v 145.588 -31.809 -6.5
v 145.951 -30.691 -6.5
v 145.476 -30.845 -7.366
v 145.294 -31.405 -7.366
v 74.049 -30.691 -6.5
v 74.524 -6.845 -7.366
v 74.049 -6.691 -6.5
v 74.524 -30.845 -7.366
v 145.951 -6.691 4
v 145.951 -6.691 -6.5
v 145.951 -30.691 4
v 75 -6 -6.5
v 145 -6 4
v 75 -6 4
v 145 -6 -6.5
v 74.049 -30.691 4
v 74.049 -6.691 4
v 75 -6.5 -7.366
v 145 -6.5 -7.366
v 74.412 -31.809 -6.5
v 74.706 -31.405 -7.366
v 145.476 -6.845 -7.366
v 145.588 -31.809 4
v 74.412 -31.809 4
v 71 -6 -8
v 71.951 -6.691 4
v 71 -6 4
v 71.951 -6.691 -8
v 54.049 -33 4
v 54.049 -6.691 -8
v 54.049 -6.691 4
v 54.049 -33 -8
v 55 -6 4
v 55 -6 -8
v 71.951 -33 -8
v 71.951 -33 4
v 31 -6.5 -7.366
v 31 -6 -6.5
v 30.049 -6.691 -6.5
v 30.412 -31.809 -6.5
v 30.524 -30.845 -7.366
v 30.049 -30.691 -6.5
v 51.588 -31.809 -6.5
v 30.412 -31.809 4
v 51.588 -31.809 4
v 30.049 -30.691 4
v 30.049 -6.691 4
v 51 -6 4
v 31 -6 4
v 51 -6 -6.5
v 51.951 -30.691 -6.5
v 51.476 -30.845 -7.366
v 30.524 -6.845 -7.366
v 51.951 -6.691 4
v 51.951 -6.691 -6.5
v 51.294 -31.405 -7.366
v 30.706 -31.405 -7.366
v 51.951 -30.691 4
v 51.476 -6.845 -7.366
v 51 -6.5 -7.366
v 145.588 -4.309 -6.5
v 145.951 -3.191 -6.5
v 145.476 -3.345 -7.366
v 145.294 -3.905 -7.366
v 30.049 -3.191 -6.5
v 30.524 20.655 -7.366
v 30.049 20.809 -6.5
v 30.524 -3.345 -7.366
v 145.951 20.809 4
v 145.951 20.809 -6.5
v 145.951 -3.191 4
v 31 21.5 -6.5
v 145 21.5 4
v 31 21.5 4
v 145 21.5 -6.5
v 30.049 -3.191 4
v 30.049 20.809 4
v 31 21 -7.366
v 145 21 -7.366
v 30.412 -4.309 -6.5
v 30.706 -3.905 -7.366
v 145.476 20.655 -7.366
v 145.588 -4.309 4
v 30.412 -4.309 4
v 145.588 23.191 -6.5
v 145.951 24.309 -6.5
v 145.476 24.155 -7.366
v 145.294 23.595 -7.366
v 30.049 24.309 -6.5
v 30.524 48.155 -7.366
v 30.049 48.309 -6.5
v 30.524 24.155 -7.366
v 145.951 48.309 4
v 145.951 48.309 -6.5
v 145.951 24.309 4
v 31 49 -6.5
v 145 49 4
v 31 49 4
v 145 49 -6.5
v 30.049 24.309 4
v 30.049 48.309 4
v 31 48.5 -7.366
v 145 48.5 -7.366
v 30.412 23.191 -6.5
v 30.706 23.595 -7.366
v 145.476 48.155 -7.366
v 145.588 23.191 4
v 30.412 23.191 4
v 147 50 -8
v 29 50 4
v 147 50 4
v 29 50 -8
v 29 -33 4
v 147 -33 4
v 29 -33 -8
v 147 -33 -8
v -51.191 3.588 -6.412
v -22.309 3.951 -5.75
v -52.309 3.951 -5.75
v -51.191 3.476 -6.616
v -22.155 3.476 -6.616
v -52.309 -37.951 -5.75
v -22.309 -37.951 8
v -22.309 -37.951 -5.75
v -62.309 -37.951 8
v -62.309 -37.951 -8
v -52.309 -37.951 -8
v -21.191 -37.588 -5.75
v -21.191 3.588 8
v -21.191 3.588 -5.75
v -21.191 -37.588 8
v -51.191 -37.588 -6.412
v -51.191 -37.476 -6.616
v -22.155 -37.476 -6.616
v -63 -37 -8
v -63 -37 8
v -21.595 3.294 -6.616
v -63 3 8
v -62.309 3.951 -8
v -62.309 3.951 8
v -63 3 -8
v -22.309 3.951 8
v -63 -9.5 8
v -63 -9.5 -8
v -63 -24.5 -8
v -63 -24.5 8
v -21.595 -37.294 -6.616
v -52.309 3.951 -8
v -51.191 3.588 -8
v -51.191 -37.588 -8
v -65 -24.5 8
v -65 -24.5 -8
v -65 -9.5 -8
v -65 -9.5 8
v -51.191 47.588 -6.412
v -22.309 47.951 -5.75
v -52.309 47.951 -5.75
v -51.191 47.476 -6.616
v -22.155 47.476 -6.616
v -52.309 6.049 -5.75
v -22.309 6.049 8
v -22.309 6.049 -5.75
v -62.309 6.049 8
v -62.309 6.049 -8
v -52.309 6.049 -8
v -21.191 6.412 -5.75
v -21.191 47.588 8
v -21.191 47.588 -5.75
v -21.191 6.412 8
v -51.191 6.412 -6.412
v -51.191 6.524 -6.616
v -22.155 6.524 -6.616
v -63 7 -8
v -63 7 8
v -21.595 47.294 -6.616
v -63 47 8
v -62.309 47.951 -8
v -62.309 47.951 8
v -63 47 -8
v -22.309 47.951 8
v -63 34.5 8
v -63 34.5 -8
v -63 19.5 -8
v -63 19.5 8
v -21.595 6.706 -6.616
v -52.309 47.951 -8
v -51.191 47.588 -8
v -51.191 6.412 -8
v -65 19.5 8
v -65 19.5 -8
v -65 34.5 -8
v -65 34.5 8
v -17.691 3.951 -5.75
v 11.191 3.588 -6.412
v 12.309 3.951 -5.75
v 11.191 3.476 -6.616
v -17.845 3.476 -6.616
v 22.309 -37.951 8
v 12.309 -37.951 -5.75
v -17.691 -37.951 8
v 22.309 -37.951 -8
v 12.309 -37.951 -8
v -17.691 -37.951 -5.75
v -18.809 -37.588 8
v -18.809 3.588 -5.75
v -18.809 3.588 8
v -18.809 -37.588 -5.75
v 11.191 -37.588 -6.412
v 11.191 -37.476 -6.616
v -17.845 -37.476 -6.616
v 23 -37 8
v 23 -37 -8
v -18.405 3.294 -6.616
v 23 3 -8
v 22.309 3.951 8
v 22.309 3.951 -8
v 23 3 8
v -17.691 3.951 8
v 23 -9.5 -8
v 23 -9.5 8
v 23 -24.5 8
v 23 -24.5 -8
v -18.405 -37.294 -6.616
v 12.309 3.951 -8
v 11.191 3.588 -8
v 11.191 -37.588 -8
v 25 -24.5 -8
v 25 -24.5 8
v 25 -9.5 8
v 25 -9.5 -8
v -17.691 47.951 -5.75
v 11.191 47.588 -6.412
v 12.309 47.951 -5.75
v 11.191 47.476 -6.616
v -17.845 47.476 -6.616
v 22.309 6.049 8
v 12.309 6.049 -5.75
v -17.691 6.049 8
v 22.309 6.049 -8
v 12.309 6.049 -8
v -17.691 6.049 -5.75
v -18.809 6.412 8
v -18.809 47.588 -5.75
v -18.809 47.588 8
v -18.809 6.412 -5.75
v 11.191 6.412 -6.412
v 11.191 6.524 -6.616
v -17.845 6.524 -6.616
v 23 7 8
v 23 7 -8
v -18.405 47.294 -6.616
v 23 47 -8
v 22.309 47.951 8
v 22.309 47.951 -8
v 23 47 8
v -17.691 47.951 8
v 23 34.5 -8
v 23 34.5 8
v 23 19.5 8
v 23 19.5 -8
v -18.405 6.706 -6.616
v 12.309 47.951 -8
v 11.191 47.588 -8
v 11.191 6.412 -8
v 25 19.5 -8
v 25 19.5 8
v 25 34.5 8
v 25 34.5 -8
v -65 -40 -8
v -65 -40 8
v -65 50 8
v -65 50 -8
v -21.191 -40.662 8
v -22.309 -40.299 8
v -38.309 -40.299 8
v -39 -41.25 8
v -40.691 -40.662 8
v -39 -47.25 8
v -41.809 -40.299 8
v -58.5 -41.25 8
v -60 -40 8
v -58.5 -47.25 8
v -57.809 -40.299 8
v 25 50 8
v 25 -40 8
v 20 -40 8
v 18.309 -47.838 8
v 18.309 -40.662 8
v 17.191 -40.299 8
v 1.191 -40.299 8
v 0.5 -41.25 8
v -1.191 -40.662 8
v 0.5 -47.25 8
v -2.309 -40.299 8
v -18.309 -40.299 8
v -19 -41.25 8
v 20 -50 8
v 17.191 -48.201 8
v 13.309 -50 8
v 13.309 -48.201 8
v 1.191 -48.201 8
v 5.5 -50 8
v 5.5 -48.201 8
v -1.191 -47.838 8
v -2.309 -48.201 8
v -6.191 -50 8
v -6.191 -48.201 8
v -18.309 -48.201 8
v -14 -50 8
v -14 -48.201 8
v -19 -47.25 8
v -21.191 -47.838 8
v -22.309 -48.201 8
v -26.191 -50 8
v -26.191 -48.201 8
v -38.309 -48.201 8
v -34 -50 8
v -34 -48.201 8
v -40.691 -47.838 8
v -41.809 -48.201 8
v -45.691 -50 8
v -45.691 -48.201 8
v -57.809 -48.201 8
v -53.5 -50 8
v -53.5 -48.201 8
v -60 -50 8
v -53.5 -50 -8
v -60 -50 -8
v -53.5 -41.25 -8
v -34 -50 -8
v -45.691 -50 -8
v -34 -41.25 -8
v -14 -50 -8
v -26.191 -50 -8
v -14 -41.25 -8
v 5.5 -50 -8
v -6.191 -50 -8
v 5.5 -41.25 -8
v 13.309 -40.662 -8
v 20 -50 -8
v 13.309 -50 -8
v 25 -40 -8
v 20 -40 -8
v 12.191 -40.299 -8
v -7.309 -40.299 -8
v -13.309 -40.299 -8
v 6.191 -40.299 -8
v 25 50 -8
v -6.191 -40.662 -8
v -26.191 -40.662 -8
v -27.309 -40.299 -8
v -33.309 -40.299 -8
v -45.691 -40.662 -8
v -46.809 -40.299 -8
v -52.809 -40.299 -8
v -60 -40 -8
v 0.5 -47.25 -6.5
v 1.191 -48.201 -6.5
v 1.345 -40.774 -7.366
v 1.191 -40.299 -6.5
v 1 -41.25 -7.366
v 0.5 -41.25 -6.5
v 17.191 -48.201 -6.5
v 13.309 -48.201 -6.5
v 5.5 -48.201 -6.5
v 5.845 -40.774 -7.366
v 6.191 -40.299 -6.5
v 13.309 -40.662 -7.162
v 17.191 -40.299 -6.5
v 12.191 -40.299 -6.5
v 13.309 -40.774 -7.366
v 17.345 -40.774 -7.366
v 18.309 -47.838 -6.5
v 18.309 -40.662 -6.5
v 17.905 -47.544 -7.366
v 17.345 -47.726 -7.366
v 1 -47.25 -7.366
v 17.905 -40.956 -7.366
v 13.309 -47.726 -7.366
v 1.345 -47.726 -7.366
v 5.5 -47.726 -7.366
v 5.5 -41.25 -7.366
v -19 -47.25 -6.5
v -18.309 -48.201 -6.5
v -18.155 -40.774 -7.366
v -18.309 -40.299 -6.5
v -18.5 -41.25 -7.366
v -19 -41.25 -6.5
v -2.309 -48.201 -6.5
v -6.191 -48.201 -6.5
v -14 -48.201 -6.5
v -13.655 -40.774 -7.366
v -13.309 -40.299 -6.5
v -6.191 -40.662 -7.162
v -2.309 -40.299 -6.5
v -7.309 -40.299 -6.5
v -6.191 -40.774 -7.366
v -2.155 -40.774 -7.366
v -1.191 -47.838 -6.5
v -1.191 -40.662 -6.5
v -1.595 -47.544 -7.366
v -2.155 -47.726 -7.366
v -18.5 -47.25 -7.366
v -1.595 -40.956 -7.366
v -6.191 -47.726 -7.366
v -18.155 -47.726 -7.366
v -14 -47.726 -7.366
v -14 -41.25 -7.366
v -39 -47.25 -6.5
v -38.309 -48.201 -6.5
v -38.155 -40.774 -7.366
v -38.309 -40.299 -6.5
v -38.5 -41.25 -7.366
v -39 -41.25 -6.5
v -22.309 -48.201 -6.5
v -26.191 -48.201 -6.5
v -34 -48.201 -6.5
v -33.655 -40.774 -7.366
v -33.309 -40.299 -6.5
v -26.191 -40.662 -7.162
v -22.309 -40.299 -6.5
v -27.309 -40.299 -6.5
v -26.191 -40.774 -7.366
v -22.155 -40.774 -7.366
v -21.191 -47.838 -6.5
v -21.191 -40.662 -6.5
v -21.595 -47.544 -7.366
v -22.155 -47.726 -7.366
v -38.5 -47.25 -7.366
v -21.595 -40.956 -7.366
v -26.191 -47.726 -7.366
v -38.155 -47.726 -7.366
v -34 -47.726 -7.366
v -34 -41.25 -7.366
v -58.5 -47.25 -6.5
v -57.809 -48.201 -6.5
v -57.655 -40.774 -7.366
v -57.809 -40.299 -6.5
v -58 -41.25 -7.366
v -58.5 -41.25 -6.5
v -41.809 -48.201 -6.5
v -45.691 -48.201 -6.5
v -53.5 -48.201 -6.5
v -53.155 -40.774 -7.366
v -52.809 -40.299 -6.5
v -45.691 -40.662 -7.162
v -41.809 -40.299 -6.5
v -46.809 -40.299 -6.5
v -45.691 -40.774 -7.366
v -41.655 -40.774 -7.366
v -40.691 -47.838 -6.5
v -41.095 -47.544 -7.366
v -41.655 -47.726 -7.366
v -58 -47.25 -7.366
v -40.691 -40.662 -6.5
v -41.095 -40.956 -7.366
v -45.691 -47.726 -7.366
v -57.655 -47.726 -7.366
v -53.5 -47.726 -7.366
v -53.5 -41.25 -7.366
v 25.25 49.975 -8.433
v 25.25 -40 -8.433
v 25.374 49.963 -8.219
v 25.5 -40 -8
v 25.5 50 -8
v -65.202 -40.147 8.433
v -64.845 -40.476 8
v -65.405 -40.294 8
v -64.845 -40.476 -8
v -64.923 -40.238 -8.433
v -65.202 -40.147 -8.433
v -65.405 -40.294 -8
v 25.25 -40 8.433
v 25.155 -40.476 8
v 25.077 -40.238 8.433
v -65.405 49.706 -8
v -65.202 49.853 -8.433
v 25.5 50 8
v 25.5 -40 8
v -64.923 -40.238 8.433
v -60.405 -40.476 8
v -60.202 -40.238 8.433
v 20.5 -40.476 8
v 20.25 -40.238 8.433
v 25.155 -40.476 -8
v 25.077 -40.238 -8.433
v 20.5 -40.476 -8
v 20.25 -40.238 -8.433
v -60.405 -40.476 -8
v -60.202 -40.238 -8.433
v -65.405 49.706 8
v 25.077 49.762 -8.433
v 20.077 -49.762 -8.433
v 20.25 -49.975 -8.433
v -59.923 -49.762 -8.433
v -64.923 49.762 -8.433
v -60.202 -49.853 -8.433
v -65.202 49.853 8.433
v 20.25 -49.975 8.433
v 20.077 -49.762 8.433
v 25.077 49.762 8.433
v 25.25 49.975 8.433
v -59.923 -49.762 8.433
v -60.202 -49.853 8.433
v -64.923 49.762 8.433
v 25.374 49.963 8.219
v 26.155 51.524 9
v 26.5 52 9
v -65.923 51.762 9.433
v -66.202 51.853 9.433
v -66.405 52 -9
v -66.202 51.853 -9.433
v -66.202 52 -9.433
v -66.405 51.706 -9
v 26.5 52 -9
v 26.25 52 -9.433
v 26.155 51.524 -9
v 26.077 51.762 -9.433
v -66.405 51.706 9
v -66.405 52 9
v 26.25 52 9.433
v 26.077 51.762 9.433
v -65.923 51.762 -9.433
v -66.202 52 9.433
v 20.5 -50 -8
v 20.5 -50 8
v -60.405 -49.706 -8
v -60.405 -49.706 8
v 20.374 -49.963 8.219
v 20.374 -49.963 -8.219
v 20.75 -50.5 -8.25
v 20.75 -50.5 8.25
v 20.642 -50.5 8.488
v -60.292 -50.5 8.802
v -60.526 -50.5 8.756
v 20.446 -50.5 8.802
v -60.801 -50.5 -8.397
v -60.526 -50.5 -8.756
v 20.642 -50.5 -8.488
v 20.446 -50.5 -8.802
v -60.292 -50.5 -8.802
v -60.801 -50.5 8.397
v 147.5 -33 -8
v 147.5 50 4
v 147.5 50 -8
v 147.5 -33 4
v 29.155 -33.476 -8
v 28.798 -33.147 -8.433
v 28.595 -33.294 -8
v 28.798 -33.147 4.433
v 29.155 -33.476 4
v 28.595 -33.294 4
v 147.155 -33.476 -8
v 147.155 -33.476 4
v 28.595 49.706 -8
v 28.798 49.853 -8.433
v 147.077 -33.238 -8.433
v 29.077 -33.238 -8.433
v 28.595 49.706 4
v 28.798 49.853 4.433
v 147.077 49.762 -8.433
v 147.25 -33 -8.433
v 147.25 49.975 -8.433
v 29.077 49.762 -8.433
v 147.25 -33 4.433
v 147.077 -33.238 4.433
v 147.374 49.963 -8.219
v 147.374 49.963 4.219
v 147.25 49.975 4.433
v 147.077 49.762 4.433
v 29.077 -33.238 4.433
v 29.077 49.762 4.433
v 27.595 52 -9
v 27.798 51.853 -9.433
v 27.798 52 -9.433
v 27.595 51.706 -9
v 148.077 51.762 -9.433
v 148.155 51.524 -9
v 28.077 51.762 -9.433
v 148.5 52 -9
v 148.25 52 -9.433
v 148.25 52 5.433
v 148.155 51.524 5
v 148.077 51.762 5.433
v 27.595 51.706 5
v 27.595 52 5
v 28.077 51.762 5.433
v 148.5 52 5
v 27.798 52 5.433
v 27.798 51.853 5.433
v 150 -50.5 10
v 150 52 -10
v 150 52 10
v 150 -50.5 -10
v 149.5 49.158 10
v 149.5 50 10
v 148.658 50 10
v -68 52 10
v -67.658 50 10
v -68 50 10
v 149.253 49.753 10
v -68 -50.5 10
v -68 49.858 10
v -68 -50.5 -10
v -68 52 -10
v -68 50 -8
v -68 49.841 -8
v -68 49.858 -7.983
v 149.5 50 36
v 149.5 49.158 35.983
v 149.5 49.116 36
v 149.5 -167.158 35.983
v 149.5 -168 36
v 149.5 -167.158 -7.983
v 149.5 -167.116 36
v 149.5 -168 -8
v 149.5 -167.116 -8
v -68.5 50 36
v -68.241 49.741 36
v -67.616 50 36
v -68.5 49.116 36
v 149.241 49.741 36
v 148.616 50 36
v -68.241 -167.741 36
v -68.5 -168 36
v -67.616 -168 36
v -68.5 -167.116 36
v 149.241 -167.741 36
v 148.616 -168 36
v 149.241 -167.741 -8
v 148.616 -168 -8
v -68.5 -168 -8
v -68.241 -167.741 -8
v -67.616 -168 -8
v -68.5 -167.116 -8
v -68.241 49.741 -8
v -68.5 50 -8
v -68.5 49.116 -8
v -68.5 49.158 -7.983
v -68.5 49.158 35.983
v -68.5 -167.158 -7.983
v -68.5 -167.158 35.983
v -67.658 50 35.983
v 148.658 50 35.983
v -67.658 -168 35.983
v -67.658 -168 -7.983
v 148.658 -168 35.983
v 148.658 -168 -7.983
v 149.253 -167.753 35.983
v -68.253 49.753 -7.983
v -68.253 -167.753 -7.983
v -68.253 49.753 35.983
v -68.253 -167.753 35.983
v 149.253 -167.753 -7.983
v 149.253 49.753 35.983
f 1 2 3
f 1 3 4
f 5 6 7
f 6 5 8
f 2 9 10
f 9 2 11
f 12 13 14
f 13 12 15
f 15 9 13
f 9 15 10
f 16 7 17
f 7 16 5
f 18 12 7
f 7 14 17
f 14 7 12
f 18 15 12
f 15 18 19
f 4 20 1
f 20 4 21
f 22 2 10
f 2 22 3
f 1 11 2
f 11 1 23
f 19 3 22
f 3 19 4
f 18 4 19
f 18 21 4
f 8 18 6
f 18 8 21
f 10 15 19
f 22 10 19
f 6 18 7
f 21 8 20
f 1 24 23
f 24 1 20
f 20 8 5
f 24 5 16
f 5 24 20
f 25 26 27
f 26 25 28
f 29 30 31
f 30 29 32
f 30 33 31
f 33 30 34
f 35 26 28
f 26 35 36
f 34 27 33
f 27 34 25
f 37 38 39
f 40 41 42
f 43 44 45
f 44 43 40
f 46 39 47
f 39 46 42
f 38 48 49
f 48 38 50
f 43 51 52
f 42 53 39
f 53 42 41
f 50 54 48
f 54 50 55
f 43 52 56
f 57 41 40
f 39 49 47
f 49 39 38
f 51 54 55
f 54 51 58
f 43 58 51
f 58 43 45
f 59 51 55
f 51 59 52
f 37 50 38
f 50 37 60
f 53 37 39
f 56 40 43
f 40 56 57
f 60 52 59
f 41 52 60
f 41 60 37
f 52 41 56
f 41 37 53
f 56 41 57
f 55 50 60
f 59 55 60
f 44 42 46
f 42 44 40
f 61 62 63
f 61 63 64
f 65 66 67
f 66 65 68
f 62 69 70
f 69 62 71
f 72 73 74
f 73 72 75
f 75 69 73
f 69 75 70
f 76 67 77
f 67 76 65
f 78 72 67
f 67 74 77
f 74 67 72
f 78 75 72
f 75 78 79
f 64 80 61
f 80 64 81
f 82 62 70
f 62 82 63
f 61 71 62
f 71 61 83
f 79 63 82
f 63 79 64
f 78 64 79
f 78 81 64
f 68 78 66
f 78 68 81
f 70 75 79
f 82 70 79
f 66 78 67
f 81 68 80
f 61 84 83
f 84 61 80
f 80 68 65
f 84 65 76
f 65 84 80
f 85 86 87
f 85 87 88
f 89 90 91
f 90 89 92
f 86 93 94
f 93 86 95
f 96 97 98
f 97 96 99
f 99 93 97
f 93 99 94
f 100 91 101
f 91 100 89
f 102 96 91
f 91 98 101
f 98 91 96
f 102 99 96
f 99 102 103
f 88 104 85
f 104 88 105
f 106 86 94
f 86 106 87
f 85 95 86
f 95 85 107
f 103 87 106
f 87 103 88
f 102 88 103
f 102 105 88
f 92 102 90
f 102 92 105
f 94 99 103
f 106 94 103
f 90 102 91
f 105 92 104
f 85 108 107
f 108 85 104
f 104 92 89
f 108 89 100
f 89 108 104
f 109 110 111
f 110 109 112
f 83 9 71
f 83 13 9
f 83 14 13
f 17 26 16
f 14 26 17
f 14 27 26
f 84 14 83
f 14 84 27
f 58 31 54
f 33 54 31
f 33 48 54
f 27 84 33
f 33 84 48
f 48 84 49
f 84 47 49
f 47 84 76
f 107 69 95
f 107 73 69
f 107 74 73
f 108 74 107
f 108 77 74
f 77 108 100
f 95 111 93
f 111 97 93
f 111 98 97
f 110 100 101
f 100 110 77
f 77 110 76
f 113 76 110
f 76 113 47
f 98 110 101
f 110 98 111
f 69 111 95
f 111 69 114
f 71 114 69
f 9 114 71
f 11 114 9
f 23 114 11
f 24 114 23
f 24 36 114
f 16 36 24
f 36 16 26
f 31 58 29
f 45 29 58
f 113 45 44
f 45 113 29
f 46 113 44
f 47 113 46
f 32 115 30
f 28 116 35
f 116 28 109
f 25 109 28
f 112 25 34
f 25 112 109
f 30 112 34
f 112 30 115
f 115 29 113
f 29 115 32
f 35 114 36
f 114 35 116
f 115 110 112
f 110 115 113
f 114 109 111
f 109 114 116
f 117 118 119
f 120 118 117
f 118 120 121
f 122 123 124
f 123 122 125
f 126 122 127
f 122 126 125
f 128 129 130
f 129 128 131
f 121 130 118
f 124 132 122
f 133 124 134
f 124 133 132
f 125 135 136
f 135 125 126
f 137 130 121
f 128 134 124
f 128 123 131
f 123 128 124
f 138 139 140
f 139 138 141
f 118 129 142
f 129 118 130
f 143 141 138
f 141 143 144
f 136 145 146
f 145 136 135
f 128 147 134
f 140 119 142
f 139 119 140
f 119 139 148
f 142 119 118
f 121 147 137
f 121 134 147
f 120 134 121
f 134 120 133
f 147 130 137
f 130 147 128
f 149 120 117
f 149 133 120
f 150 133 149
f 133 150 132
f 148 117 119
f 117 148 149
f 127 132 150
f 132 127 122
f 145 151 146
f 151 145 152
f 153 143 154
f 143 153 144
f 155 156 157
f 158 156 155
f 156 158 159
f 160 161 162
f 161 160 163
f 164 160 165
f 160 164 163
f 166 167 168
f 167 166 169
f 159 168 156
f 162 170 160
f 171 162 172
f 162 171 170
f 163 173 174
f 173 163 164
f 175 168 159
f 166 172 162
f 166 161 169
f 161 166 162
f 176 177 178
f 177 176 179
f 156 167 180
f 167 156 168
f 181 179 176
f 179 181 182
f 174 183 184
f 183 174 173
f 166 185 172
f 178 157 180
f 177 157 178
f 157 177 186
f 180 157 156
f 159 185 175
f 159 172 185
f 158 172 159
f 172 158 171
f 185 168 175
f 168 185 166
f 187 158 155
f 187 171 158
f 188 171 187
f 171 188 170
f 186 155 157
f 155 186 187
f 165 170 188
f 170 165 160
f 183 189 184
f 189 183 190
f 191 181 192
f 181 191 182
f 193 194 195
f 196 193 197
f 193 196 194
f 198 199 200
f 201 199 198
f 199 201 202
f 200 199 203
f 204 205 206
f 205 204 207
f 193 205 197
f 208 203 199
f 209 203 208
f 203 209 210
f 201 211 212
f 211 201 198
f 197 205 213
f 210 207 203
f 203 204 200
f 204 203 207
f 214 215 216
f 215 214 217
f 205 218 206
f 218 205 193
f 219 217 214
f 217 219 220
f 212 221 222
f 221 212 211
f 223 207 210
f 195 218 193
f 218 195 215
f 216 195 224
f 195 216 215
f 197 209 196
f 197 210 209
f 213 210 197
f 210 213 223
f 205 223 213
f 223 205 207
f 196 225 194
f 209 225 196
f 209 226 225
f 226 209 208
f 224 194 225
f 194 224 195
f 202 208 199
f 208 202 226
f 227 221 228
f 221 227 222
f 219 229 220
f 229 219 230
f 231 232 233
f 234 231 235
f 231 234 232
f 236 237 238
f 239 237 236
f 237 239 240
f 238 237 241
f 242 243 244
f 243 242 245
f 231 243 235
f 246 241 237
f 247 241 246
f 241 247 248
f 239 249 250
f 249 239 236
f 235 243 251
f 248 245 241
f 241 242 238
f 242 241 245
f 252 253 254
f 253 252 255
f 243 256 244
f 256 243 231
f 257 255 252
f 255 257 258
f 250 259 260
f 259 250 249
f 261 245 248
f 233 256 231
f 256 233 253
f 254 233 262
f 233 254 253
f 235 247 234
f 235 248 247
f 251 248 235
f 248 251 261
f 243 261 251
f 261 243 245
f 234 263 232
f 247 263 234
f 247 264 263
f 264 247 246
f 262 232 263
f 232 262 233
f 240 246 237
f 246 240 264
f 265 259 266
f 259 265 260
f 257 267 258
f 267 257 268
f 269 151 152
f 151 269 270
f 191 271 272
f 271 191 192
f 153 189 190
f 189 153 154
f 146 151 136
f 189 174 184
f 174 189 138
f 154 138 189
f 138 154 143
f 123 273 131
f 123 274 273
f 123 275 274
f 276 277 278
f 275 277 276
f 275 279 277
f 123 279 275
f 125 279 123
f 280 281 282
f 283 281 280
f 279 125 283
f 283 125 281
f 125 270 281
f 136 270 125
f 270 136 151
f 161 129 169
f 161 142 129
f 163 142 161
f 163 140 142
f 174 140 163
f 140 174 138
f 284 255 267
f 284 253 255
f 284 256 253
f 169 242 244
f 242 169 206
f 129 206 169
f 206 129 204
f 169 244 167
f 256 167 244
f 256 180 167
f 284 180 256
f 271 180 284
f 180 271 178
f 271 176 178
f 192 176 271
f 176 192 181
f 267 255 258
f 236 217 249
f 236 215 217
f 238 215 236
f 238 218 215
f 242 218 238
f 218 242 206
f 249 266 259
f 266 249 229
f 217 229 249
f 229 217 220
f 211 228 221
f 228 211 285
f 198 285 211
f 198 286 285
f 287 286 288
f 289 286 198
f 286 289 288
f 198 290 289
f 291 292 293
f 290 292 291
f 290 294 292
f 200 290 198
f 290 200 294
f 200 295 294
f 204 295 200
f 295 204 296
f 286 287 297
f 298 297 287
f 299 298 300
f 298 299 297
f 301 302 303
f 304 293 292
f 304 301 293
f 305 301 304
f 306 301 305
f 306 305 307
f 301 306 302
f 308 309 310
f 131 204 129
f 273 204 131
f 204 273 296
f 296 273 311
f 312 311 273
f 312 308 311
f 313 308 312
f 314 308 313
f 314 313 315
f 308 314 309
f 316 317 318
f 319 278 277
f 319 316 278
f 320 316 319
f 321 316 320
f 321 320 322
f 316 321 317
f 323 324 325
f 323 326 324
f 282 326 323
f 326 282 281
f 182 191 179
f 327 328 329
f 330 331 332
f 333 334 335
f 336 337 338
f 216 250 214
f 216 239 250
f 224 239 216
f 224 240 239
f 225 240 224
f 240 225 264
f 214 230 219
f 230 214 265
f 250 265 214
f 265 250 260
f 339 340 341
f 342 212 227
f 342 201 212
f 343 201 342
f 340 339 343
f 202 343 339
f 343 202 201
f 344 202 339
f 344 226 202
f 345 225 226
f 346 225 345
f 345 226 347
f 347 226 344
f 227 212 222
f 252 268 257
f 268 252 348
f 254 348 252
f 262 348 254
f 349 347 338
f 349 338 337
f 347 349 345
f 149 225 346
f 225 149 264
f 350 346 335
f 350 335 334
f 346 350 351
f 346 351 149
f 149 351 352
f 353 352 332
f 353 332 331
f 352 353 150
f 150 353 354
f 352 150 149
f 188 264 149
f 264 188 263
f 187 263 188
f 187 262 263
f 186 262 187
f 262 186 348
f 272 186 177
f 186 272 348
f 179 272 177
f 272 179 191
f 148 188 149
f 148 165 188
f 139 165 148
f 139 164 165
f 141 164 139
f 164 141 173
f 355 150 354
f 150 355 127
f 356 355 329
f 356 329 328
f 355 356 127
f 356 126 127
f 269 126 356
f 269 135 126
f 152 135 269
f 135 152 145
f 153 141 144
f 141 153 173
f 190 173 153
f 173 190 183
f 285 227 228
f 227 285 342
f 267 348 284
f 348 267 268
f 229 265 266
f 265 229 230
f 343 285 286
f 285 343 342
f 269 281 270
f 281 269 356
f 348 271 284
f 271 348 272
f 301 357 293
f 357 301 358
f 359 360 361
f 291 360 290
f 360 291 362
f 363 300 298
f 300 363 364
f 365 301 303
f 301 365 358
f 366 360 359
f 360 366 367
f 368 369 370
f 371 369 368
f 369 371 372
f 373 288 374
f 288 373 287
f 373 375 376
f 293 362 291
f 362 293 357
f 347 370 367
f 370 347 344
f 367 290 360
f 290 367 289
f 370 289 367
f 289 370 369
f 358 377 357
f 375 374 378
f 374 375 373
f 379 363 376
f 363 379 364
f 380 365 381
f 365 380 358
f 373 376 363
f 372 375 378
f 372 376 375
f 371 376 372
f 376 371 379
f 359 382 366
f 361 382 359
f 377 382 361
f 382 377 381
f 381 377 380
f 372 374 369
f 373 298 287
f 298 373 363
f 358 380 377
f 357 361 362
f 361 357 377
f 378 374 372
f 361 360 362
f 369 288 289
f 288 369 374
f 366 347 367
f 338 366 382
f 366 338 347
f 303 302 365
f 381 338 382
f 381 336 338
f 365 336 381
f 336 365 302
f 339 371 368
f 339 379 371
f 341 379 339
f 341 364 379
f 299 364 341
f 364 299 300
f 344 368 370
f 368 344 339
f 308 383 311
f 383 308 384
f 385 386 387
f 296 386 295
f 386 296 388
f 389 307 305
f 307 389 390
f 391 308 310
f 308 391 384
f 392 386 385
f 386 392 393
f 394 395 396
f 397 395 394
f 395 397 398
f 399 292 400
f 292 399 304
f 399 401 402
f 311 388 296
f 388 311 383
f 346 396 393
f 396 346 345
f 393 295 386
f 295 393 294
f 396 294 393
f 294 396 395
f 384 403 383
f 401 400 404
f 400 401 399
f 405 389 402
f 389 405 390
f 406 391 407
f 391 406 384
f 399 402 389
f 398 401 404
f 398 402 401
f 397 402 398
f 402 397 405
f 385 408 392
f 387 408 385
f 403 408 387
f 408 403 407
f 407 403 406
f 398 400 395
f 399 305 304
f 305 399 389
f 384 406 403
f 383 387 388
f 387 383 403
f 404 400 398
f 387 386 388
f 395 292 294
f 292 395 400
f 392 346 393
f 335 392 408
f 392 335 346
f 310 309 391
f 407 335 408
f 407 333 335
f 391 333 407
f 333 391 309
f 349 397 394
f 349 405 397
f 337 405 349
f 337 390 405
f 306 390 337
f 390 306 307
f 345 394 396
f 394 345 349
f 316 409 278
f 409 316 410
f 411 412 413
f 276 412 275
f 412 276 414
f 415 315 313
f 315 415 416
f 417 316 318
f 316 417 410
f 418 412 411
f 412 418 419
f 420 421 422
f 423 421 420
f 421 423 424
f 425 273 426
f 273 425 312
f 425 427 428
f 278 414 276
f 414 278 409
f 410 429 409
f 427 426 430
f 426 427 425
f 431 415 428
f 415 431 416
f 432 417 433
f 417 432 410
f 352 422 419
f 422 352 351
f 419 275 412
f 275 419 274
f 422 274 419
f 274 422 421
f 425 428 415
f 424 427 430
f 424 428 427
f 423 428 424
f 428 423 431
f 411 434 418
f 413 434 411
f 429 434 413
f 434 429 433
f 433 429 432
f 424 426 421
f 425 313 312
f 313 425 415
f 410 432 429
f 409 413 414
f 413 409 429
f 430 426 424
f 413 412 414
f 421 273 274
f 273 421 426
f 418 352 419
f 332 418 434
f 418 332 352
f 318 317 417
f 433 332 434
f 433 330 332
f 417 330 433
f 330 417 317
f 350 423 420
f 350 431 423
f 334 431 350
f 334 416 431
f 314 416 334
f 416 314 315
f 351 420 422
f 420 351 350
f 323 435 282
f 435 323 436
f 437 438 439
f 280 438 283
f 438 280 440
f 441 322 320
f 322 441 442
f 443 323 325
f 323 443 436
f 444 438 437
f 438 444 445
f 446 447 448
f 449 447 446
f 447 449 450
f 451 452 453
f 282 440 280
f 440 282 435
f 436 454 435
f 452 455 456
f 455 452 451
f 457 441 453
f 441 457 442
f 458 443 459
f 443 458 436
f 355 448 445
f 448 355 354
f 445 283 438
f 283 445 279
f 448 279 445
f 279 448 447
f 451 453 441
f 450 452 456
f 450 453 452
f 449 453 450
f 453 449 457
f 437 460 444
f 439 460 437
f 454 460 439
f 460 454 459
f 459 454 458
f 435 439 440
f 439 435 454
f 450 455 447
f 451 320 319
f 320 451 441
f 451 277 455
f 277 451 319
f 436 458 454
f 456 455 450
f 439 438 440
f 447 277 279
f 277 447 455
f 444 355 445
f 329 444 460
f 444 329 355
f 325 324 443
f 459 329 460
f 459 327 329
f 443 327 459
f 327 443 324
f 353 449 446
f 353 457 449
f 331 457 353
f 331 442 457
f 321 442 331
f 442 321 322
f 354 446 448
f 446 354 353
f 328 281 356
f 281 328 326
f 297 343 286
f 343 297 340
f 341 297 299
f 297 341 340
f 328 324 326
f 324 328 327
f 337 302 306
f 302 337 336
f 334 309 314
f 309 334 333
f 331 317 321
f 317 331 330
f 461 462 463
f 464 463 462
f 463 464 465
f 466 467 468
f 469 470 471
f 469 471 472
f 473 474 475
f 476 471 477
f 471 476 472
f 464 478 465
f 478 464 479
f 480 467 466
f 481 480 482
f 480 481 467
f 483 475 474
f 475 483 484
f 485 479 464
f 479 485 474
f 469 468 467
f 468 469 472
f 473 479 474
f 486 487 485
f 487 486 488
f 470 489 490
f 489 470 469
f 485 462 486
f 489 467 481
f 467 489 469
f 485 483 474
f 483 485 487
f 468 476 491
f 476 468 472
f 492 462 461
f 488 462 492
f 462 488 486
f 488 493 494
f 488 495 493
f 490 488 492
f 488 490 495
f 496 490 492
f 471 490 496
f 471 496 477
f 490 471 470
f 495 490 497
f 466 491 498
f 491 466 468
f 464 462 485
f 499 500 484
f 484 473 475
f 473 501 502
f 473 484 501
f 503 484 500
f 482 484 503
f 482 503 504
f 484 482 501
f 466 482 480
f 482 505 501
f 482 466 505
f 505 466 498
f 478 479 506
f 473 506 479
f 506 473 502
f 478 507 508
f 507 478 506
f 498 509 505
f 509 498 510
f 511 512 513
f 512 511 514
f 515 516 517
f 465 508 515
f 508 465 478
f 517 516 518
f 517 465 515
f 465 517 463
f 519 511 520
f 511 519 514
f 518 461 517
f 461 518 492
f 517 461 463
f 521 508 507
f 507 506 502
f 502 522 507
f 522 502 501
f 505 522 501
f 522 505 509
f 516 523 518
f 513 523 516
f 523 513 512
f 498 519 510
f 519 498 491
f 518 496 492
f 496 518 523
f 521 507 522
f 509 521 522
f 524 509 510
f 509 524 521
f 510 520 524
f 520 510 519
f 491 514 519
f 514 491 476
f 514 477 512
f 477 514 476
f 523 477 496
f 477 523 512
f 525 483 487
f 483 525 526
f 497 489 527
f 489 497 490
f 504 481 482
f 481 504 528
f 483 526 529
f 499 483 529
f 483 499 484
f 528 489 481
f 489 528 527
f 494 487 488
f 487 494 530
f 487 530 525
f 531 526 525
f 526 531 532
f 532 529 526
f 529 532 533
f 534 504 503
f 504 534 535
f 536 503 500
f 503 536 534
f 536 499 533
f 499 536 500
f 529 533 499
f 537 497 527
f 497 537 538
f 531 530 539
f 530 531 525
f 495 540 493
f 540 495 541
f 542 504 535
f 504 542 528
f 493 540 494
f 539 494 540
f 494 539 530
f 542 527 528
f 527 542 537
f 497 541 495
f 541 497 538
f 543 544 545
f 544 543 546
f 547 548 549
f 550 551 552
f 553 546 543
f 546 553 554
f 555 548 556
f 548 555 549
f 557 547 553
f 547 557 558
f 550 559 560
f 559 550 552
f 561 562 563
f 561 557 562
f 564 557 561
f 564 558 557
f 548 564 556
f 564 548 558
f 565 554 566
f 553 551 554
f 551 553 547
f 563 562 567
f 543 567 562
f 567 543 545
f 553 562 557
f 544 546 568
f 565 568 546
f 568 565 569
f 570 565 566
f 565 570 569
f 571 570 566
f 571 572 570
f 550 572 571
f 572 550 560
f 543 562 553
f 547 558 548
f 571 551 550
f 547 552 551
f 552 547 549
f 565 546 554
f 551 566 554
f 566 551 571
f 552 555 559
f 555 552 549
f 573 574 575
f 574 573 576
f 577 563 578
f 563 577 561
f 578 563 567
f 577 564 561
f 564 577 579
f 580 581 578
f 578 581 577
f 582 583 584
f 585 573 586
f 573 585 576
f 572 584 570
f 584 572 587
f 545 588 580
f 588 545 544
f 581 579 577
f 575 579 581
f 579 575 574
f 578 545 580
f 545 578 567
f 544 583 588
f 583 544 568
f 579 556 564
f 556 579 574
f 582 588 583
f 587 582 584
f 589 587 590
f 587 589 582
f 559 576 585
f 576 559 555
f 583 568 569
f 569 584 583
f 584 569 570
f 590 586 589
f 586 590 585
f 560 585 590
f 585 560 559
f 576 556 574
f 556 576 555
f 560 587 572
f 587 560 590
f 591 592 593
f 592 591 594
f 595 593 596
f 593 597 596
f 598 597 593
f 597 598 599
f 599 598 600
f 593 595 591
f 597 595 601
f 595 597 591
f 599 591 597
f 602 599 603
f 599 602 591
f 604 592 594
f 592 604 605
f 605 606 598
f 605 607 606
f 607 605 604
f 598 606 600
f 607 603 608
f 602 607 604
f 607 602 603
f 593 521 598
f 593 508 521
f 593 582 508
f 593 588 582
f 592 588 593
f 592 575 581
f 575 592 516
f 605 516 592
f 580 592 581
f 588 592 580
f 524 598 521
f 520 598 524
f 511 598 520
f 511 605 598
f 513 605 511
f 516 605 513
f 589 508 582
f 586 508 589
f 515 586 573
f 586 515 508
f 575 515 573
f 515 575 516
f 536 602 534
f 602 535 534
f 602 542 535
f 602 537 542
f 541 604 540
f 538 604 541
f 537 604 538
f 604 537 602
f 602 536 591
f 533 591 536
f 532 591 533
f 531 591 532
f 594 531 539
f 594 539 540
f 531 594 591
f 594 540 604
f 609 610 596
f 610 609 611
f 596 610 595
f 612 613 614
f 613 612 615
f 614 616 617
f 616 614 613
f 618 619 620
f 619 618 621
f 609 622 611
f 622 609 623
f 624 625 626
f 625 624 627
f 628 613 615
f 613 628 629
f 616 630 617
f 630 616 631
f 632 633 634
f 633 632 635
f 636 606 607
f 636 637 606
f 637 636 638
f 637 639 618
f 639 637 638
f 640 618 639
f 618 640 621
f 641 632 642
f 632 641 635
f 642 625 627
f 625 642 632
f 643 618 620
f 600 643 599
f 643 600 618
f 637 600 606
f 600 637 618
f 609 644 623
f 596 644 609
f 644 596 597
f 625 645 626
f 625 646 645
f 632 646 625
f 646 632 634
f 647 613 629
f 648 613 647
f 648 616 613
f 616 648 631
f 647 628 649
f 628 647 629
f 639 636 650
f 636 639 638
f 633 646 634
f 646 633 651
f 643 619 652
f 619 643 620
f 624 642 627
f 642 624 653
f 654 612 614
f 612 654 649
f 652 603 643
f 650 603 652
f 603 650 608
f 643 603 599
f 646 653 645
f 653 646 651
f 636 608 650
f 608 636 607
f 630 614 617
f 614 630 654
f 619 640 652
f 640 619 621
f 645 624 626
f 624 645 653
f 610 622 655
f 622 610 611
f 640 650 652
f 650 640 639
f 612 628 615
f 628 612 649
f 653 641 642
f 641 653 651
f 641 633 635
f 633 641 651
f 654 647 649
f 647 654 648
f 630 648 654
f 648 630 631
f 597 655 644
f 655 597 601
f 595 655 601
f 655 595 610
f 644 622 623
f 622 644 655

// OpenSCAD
/* $fa = 1; */
/* $fs = 0.4; */

wall=1.5;
eps=0.1;

cardB=55;
cardH=87;


module roundCube(dimensions, r=1, fn=0) {
    if (r==0) {
        cube(dimensions, center=true);
    } else {
        x=dimensions[0];
        y=dimensions[1];
        z=dimensions[2];
        hull()
            for (xyz=[[1,1,1],[1,1,-1],[1,-1,1],[1,-1,-1],[-1,1,1],[-1,1,-1],[-1,-1,1],[-1,-1,-1]]){
                translate([xyz[0]*x/2, xyz[1]*y/2, xyz[2]*z/2])
                    sphere(r=r, $fn=fn);
            }
    }
}

module deck(h, plus=0) {
    difference() {
        translate([0,4.5/2,0])
            cube([cardB+2*wall,cardH+2*wall + 4.5,h+2*wall+plus], center=true);
        union() {
            translate([0,5/2,0])
                roundCube([cardB,cardH + 5,h]);
            hull() {
                translate([0,50,0])
                    cube([cardB,4,h],center=true);
                translate([0,50+3,0])
                    cube([cardB+6,2,h+6],center=true);
            }

            translate([0,50,0])
                hull() {
                    roundCube([0,10,max(h-3,0)],r=10);
                }
        }
    }
}

module herosDeck() { deck(5, plus=1); }
module animalsDeck() { deck(12,plus=1); }
module aiDeck() { deck(3, plus=1); }

module decks() {
    translate([60,0,0]) {
        animalsDeck();
        translate([60,0,-3.5]) {
            herosDeck();
            translate([0,0,8])
                aiDeck();
        }
    }
}

module 7quests() {
    roundCube([40,40,14.5]);
    translate([15,0,0])
        roundCube([10,40,20]);
    translate([20,0,])
        cube([15,15,20],center=true);
}

module allquests() {
    for (xy=[[1,1],[1,-1]]){
        translate([xy[0]*22,xy[1]*22,0])
            7quests();
    }
    mirror(v= [1,0,0] )
        for (xy=[[1,1],[1,-1]]){
            translate([xy[0]*22,xy[1]*22,0])
                7quests();
        }
}

module questTray() {
    rotate([0,0,180]) {
    translate([0,-5,0]) {
        difference() {
            cube([90,90,16], center=true); 
            translate([0,0,wall])
                union() {
                    allquests();
                    translate([0,0,10])
                        allquests();
                }
        }
        translate([0,45+5,0]) {
            difference() {
                cube([80,10,16], center=true);
                translate([0,-0.75,2 + wall]) {
                    for(x=[-29.5, -10, 10, 29.5]) {
                        translate([x,0,0]) {
                            roundCube([16,6,20], r=1);
                            translate([0,2,0])
                            roundCube([6,10,30], r=1);
                        }
                    }
                }
            }
        }
    }
    }
}

module workerTray() {
    difference() {
        cube([83,118,12], center=true);
        translate([0,0,wall])
            union() {
                translate([-27.5,-22,0])
                    roundCube([24,70,12]);
                translate([-29.5,25,0])
                    roundCube([28,16,20]);
                translate([-27.5,47,0])
                    roundCube([24,20,12]);
                roundCube([24,114,12]);
                translate([27.5,0,0])
                    roundCube([24,114,12]);
            }
    }
}

module trayTray() {
    difference() {
        translate([41,0.75,0])
            cube([218,102.5,20], center=true);
        union() {
            hull() 
                for(shift=[[-20,-40,0],[-20,50,0]]) {
                    translate(shift)
                        roundCube([90,0,16], r=0.5);
                }
            hull() 
                for(shift=[[-20,50,0]
                        ,[-19,52,1]
                        ,[-21,52,1]
                        ,[-21,52,-1]
                        ,[-19,52,-1]]) {
                    translate(shift)
                        roundCube([90,0,16], r=0.5);
                }
            hull() 
                for(shift=[[-20,-40,0],[-20,-50,0]]) {
                    translate(shift)
                        roundCube([80,0,16], r=0.5);
                }
            hull() 
                for(shift=[[-20,-50,0]
                          ,[-19,-52,1]
                          ,[-19,-52,-1]
                          ,[-21,-52,-1]
                          ,[-21,-52,1]
                    ]) {
                    translate(shift)
                        roundCube([80,0,16], r=0.5);
                }
            hull() 
                for(shift=[[88,-33,-2],[88,50,-2]]) {
                    translate(shift)
                        roundCube([118,0,12], r=0.5);
                }
            hull() 
                for(shift=[[88,50,-2]
                        ,[89,52,-1]
                        ,[89,52,-3]
                        ,[87,52,-3]
                        ,[87,52,-1]
                ]) {
                    translate(shift)
                        roundCube([118,0,12], r=0.5);
                }
        }
    }
}

translate([88,8.5,-2])
    rotate([0,0,90])
    workerTray();

translate([-20,0,0])
    questTray();

color("green")
trayTray();

translate([40.5,-59,14])
    difference() {
        cube([218,218,44],center=true);
        roundCube([216.2,216.2,43.2],fn=8);
    }

/* translate([40.5,-59,14]) */
/*     translate([300,0,0]) { */
/*         difference(){ */
/*             cube([218,218,44],center=true); */
/*             union() { */
/*                 translate([(218-202 + eps)/2,(218-100 + eps)/2,(44-28 + eps)/2]) */
/*                     cube([202,100,28],center=true); */
/*             } */
/*         } */
/*     } */
